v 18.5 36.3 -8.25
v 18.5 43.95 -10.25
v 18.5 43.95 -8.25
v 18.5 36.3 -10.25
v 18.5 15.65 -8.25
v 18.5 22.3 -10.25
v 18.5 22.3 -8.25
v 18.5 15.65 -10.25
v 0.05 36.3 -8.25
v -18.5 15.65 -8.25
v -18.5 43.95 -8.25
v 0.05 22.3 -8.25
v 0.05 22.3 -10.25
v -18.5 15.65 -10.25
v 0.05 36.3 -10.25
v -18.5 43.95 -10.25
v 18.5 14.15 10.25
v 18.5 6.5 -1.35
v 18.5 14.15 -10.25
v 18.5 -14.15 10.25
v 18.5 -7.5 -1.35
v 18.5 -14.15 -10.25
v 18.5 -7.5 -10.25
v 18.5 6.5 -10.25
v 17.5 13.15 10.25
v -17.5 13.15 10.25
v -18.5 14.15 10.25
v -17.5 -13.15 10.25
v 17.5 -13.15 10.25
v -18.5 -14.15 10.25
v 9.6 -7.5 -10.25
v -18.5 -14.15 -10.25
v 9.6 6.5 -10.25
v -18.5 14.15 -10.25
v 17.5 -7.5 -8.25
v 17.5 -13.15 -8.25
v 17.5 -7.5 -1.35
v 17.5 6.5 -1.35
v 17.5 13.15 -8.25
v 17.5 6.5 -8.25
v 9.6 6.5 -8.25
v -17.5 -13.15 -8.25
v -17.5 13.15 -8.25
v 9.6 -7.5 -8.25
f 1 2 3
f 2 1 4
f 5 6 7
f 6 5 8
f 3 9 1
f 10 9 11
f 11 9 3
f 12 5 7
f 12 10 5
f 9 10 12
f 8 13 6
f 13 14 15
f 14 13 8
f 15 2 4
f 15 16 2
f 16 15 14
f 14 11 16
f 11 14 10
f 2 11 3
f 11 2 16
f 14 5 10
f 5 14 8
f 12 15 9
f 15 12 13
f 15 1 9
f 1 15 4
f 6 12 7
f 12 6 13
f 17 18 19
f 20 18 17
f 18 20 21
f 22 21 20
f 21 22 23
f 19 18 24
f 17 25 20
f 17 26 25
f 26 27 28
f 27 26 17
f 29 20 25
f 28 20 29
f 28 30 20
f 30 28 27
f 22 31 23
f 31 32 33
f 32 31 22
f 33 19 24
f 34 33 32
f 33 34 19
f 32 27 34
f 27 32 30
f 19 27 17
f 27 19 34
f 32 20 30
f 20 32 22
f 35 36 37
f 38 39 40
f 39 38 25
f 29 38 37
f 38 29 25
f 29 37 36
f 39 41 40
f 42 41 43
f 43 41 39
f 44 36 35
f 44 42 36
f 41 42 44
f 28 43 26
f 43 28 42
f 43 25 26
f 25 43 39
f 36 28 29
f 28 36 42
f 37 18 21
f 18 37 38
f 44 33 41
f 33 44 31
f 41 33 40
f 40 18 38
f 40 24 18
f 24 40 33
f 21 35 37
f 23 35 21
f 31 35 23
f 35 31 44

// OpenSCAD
largura = 26.3;
profundidade = 35;
altura = 20.5;
parede = 2;

profDHT = 18.5;   // prof real: 15.5
largDHT = 14;   // larg real: 12

altUSB = 9;
largUSB = 14;
profUSB = 9;

locProfUSB = ((profundidade)/2)-3.4;
locLargUSB = -0.5;
locAltUSB = ((altUSB-altura)/2)-0.1;

module caixa(){
    difference(){
        cube([profundidade+parede, largura+parede, altura], center=true); //volume externo
        translate([0,0,parede]) cube([profundidade, largura, altura], center=true); // volume interno
        translate([locProfUSB, locLargUSB, locAltUSB]) cube([profUSB, largUSB, altUSB], center=true); // abertura usb
    }
}

module tampa(){
    difference(){
        cube([profundidade+parede, largura+parede, parede], center=true);
        translate([9.3,-0.5,0]) cube([profDHT, largDHT, 3], center=true); // abertuda DHT
    }
}

// tampa e caixa
translate([0,largura+3.5,-((altura/2)-1)]) tampa();
caixa();
